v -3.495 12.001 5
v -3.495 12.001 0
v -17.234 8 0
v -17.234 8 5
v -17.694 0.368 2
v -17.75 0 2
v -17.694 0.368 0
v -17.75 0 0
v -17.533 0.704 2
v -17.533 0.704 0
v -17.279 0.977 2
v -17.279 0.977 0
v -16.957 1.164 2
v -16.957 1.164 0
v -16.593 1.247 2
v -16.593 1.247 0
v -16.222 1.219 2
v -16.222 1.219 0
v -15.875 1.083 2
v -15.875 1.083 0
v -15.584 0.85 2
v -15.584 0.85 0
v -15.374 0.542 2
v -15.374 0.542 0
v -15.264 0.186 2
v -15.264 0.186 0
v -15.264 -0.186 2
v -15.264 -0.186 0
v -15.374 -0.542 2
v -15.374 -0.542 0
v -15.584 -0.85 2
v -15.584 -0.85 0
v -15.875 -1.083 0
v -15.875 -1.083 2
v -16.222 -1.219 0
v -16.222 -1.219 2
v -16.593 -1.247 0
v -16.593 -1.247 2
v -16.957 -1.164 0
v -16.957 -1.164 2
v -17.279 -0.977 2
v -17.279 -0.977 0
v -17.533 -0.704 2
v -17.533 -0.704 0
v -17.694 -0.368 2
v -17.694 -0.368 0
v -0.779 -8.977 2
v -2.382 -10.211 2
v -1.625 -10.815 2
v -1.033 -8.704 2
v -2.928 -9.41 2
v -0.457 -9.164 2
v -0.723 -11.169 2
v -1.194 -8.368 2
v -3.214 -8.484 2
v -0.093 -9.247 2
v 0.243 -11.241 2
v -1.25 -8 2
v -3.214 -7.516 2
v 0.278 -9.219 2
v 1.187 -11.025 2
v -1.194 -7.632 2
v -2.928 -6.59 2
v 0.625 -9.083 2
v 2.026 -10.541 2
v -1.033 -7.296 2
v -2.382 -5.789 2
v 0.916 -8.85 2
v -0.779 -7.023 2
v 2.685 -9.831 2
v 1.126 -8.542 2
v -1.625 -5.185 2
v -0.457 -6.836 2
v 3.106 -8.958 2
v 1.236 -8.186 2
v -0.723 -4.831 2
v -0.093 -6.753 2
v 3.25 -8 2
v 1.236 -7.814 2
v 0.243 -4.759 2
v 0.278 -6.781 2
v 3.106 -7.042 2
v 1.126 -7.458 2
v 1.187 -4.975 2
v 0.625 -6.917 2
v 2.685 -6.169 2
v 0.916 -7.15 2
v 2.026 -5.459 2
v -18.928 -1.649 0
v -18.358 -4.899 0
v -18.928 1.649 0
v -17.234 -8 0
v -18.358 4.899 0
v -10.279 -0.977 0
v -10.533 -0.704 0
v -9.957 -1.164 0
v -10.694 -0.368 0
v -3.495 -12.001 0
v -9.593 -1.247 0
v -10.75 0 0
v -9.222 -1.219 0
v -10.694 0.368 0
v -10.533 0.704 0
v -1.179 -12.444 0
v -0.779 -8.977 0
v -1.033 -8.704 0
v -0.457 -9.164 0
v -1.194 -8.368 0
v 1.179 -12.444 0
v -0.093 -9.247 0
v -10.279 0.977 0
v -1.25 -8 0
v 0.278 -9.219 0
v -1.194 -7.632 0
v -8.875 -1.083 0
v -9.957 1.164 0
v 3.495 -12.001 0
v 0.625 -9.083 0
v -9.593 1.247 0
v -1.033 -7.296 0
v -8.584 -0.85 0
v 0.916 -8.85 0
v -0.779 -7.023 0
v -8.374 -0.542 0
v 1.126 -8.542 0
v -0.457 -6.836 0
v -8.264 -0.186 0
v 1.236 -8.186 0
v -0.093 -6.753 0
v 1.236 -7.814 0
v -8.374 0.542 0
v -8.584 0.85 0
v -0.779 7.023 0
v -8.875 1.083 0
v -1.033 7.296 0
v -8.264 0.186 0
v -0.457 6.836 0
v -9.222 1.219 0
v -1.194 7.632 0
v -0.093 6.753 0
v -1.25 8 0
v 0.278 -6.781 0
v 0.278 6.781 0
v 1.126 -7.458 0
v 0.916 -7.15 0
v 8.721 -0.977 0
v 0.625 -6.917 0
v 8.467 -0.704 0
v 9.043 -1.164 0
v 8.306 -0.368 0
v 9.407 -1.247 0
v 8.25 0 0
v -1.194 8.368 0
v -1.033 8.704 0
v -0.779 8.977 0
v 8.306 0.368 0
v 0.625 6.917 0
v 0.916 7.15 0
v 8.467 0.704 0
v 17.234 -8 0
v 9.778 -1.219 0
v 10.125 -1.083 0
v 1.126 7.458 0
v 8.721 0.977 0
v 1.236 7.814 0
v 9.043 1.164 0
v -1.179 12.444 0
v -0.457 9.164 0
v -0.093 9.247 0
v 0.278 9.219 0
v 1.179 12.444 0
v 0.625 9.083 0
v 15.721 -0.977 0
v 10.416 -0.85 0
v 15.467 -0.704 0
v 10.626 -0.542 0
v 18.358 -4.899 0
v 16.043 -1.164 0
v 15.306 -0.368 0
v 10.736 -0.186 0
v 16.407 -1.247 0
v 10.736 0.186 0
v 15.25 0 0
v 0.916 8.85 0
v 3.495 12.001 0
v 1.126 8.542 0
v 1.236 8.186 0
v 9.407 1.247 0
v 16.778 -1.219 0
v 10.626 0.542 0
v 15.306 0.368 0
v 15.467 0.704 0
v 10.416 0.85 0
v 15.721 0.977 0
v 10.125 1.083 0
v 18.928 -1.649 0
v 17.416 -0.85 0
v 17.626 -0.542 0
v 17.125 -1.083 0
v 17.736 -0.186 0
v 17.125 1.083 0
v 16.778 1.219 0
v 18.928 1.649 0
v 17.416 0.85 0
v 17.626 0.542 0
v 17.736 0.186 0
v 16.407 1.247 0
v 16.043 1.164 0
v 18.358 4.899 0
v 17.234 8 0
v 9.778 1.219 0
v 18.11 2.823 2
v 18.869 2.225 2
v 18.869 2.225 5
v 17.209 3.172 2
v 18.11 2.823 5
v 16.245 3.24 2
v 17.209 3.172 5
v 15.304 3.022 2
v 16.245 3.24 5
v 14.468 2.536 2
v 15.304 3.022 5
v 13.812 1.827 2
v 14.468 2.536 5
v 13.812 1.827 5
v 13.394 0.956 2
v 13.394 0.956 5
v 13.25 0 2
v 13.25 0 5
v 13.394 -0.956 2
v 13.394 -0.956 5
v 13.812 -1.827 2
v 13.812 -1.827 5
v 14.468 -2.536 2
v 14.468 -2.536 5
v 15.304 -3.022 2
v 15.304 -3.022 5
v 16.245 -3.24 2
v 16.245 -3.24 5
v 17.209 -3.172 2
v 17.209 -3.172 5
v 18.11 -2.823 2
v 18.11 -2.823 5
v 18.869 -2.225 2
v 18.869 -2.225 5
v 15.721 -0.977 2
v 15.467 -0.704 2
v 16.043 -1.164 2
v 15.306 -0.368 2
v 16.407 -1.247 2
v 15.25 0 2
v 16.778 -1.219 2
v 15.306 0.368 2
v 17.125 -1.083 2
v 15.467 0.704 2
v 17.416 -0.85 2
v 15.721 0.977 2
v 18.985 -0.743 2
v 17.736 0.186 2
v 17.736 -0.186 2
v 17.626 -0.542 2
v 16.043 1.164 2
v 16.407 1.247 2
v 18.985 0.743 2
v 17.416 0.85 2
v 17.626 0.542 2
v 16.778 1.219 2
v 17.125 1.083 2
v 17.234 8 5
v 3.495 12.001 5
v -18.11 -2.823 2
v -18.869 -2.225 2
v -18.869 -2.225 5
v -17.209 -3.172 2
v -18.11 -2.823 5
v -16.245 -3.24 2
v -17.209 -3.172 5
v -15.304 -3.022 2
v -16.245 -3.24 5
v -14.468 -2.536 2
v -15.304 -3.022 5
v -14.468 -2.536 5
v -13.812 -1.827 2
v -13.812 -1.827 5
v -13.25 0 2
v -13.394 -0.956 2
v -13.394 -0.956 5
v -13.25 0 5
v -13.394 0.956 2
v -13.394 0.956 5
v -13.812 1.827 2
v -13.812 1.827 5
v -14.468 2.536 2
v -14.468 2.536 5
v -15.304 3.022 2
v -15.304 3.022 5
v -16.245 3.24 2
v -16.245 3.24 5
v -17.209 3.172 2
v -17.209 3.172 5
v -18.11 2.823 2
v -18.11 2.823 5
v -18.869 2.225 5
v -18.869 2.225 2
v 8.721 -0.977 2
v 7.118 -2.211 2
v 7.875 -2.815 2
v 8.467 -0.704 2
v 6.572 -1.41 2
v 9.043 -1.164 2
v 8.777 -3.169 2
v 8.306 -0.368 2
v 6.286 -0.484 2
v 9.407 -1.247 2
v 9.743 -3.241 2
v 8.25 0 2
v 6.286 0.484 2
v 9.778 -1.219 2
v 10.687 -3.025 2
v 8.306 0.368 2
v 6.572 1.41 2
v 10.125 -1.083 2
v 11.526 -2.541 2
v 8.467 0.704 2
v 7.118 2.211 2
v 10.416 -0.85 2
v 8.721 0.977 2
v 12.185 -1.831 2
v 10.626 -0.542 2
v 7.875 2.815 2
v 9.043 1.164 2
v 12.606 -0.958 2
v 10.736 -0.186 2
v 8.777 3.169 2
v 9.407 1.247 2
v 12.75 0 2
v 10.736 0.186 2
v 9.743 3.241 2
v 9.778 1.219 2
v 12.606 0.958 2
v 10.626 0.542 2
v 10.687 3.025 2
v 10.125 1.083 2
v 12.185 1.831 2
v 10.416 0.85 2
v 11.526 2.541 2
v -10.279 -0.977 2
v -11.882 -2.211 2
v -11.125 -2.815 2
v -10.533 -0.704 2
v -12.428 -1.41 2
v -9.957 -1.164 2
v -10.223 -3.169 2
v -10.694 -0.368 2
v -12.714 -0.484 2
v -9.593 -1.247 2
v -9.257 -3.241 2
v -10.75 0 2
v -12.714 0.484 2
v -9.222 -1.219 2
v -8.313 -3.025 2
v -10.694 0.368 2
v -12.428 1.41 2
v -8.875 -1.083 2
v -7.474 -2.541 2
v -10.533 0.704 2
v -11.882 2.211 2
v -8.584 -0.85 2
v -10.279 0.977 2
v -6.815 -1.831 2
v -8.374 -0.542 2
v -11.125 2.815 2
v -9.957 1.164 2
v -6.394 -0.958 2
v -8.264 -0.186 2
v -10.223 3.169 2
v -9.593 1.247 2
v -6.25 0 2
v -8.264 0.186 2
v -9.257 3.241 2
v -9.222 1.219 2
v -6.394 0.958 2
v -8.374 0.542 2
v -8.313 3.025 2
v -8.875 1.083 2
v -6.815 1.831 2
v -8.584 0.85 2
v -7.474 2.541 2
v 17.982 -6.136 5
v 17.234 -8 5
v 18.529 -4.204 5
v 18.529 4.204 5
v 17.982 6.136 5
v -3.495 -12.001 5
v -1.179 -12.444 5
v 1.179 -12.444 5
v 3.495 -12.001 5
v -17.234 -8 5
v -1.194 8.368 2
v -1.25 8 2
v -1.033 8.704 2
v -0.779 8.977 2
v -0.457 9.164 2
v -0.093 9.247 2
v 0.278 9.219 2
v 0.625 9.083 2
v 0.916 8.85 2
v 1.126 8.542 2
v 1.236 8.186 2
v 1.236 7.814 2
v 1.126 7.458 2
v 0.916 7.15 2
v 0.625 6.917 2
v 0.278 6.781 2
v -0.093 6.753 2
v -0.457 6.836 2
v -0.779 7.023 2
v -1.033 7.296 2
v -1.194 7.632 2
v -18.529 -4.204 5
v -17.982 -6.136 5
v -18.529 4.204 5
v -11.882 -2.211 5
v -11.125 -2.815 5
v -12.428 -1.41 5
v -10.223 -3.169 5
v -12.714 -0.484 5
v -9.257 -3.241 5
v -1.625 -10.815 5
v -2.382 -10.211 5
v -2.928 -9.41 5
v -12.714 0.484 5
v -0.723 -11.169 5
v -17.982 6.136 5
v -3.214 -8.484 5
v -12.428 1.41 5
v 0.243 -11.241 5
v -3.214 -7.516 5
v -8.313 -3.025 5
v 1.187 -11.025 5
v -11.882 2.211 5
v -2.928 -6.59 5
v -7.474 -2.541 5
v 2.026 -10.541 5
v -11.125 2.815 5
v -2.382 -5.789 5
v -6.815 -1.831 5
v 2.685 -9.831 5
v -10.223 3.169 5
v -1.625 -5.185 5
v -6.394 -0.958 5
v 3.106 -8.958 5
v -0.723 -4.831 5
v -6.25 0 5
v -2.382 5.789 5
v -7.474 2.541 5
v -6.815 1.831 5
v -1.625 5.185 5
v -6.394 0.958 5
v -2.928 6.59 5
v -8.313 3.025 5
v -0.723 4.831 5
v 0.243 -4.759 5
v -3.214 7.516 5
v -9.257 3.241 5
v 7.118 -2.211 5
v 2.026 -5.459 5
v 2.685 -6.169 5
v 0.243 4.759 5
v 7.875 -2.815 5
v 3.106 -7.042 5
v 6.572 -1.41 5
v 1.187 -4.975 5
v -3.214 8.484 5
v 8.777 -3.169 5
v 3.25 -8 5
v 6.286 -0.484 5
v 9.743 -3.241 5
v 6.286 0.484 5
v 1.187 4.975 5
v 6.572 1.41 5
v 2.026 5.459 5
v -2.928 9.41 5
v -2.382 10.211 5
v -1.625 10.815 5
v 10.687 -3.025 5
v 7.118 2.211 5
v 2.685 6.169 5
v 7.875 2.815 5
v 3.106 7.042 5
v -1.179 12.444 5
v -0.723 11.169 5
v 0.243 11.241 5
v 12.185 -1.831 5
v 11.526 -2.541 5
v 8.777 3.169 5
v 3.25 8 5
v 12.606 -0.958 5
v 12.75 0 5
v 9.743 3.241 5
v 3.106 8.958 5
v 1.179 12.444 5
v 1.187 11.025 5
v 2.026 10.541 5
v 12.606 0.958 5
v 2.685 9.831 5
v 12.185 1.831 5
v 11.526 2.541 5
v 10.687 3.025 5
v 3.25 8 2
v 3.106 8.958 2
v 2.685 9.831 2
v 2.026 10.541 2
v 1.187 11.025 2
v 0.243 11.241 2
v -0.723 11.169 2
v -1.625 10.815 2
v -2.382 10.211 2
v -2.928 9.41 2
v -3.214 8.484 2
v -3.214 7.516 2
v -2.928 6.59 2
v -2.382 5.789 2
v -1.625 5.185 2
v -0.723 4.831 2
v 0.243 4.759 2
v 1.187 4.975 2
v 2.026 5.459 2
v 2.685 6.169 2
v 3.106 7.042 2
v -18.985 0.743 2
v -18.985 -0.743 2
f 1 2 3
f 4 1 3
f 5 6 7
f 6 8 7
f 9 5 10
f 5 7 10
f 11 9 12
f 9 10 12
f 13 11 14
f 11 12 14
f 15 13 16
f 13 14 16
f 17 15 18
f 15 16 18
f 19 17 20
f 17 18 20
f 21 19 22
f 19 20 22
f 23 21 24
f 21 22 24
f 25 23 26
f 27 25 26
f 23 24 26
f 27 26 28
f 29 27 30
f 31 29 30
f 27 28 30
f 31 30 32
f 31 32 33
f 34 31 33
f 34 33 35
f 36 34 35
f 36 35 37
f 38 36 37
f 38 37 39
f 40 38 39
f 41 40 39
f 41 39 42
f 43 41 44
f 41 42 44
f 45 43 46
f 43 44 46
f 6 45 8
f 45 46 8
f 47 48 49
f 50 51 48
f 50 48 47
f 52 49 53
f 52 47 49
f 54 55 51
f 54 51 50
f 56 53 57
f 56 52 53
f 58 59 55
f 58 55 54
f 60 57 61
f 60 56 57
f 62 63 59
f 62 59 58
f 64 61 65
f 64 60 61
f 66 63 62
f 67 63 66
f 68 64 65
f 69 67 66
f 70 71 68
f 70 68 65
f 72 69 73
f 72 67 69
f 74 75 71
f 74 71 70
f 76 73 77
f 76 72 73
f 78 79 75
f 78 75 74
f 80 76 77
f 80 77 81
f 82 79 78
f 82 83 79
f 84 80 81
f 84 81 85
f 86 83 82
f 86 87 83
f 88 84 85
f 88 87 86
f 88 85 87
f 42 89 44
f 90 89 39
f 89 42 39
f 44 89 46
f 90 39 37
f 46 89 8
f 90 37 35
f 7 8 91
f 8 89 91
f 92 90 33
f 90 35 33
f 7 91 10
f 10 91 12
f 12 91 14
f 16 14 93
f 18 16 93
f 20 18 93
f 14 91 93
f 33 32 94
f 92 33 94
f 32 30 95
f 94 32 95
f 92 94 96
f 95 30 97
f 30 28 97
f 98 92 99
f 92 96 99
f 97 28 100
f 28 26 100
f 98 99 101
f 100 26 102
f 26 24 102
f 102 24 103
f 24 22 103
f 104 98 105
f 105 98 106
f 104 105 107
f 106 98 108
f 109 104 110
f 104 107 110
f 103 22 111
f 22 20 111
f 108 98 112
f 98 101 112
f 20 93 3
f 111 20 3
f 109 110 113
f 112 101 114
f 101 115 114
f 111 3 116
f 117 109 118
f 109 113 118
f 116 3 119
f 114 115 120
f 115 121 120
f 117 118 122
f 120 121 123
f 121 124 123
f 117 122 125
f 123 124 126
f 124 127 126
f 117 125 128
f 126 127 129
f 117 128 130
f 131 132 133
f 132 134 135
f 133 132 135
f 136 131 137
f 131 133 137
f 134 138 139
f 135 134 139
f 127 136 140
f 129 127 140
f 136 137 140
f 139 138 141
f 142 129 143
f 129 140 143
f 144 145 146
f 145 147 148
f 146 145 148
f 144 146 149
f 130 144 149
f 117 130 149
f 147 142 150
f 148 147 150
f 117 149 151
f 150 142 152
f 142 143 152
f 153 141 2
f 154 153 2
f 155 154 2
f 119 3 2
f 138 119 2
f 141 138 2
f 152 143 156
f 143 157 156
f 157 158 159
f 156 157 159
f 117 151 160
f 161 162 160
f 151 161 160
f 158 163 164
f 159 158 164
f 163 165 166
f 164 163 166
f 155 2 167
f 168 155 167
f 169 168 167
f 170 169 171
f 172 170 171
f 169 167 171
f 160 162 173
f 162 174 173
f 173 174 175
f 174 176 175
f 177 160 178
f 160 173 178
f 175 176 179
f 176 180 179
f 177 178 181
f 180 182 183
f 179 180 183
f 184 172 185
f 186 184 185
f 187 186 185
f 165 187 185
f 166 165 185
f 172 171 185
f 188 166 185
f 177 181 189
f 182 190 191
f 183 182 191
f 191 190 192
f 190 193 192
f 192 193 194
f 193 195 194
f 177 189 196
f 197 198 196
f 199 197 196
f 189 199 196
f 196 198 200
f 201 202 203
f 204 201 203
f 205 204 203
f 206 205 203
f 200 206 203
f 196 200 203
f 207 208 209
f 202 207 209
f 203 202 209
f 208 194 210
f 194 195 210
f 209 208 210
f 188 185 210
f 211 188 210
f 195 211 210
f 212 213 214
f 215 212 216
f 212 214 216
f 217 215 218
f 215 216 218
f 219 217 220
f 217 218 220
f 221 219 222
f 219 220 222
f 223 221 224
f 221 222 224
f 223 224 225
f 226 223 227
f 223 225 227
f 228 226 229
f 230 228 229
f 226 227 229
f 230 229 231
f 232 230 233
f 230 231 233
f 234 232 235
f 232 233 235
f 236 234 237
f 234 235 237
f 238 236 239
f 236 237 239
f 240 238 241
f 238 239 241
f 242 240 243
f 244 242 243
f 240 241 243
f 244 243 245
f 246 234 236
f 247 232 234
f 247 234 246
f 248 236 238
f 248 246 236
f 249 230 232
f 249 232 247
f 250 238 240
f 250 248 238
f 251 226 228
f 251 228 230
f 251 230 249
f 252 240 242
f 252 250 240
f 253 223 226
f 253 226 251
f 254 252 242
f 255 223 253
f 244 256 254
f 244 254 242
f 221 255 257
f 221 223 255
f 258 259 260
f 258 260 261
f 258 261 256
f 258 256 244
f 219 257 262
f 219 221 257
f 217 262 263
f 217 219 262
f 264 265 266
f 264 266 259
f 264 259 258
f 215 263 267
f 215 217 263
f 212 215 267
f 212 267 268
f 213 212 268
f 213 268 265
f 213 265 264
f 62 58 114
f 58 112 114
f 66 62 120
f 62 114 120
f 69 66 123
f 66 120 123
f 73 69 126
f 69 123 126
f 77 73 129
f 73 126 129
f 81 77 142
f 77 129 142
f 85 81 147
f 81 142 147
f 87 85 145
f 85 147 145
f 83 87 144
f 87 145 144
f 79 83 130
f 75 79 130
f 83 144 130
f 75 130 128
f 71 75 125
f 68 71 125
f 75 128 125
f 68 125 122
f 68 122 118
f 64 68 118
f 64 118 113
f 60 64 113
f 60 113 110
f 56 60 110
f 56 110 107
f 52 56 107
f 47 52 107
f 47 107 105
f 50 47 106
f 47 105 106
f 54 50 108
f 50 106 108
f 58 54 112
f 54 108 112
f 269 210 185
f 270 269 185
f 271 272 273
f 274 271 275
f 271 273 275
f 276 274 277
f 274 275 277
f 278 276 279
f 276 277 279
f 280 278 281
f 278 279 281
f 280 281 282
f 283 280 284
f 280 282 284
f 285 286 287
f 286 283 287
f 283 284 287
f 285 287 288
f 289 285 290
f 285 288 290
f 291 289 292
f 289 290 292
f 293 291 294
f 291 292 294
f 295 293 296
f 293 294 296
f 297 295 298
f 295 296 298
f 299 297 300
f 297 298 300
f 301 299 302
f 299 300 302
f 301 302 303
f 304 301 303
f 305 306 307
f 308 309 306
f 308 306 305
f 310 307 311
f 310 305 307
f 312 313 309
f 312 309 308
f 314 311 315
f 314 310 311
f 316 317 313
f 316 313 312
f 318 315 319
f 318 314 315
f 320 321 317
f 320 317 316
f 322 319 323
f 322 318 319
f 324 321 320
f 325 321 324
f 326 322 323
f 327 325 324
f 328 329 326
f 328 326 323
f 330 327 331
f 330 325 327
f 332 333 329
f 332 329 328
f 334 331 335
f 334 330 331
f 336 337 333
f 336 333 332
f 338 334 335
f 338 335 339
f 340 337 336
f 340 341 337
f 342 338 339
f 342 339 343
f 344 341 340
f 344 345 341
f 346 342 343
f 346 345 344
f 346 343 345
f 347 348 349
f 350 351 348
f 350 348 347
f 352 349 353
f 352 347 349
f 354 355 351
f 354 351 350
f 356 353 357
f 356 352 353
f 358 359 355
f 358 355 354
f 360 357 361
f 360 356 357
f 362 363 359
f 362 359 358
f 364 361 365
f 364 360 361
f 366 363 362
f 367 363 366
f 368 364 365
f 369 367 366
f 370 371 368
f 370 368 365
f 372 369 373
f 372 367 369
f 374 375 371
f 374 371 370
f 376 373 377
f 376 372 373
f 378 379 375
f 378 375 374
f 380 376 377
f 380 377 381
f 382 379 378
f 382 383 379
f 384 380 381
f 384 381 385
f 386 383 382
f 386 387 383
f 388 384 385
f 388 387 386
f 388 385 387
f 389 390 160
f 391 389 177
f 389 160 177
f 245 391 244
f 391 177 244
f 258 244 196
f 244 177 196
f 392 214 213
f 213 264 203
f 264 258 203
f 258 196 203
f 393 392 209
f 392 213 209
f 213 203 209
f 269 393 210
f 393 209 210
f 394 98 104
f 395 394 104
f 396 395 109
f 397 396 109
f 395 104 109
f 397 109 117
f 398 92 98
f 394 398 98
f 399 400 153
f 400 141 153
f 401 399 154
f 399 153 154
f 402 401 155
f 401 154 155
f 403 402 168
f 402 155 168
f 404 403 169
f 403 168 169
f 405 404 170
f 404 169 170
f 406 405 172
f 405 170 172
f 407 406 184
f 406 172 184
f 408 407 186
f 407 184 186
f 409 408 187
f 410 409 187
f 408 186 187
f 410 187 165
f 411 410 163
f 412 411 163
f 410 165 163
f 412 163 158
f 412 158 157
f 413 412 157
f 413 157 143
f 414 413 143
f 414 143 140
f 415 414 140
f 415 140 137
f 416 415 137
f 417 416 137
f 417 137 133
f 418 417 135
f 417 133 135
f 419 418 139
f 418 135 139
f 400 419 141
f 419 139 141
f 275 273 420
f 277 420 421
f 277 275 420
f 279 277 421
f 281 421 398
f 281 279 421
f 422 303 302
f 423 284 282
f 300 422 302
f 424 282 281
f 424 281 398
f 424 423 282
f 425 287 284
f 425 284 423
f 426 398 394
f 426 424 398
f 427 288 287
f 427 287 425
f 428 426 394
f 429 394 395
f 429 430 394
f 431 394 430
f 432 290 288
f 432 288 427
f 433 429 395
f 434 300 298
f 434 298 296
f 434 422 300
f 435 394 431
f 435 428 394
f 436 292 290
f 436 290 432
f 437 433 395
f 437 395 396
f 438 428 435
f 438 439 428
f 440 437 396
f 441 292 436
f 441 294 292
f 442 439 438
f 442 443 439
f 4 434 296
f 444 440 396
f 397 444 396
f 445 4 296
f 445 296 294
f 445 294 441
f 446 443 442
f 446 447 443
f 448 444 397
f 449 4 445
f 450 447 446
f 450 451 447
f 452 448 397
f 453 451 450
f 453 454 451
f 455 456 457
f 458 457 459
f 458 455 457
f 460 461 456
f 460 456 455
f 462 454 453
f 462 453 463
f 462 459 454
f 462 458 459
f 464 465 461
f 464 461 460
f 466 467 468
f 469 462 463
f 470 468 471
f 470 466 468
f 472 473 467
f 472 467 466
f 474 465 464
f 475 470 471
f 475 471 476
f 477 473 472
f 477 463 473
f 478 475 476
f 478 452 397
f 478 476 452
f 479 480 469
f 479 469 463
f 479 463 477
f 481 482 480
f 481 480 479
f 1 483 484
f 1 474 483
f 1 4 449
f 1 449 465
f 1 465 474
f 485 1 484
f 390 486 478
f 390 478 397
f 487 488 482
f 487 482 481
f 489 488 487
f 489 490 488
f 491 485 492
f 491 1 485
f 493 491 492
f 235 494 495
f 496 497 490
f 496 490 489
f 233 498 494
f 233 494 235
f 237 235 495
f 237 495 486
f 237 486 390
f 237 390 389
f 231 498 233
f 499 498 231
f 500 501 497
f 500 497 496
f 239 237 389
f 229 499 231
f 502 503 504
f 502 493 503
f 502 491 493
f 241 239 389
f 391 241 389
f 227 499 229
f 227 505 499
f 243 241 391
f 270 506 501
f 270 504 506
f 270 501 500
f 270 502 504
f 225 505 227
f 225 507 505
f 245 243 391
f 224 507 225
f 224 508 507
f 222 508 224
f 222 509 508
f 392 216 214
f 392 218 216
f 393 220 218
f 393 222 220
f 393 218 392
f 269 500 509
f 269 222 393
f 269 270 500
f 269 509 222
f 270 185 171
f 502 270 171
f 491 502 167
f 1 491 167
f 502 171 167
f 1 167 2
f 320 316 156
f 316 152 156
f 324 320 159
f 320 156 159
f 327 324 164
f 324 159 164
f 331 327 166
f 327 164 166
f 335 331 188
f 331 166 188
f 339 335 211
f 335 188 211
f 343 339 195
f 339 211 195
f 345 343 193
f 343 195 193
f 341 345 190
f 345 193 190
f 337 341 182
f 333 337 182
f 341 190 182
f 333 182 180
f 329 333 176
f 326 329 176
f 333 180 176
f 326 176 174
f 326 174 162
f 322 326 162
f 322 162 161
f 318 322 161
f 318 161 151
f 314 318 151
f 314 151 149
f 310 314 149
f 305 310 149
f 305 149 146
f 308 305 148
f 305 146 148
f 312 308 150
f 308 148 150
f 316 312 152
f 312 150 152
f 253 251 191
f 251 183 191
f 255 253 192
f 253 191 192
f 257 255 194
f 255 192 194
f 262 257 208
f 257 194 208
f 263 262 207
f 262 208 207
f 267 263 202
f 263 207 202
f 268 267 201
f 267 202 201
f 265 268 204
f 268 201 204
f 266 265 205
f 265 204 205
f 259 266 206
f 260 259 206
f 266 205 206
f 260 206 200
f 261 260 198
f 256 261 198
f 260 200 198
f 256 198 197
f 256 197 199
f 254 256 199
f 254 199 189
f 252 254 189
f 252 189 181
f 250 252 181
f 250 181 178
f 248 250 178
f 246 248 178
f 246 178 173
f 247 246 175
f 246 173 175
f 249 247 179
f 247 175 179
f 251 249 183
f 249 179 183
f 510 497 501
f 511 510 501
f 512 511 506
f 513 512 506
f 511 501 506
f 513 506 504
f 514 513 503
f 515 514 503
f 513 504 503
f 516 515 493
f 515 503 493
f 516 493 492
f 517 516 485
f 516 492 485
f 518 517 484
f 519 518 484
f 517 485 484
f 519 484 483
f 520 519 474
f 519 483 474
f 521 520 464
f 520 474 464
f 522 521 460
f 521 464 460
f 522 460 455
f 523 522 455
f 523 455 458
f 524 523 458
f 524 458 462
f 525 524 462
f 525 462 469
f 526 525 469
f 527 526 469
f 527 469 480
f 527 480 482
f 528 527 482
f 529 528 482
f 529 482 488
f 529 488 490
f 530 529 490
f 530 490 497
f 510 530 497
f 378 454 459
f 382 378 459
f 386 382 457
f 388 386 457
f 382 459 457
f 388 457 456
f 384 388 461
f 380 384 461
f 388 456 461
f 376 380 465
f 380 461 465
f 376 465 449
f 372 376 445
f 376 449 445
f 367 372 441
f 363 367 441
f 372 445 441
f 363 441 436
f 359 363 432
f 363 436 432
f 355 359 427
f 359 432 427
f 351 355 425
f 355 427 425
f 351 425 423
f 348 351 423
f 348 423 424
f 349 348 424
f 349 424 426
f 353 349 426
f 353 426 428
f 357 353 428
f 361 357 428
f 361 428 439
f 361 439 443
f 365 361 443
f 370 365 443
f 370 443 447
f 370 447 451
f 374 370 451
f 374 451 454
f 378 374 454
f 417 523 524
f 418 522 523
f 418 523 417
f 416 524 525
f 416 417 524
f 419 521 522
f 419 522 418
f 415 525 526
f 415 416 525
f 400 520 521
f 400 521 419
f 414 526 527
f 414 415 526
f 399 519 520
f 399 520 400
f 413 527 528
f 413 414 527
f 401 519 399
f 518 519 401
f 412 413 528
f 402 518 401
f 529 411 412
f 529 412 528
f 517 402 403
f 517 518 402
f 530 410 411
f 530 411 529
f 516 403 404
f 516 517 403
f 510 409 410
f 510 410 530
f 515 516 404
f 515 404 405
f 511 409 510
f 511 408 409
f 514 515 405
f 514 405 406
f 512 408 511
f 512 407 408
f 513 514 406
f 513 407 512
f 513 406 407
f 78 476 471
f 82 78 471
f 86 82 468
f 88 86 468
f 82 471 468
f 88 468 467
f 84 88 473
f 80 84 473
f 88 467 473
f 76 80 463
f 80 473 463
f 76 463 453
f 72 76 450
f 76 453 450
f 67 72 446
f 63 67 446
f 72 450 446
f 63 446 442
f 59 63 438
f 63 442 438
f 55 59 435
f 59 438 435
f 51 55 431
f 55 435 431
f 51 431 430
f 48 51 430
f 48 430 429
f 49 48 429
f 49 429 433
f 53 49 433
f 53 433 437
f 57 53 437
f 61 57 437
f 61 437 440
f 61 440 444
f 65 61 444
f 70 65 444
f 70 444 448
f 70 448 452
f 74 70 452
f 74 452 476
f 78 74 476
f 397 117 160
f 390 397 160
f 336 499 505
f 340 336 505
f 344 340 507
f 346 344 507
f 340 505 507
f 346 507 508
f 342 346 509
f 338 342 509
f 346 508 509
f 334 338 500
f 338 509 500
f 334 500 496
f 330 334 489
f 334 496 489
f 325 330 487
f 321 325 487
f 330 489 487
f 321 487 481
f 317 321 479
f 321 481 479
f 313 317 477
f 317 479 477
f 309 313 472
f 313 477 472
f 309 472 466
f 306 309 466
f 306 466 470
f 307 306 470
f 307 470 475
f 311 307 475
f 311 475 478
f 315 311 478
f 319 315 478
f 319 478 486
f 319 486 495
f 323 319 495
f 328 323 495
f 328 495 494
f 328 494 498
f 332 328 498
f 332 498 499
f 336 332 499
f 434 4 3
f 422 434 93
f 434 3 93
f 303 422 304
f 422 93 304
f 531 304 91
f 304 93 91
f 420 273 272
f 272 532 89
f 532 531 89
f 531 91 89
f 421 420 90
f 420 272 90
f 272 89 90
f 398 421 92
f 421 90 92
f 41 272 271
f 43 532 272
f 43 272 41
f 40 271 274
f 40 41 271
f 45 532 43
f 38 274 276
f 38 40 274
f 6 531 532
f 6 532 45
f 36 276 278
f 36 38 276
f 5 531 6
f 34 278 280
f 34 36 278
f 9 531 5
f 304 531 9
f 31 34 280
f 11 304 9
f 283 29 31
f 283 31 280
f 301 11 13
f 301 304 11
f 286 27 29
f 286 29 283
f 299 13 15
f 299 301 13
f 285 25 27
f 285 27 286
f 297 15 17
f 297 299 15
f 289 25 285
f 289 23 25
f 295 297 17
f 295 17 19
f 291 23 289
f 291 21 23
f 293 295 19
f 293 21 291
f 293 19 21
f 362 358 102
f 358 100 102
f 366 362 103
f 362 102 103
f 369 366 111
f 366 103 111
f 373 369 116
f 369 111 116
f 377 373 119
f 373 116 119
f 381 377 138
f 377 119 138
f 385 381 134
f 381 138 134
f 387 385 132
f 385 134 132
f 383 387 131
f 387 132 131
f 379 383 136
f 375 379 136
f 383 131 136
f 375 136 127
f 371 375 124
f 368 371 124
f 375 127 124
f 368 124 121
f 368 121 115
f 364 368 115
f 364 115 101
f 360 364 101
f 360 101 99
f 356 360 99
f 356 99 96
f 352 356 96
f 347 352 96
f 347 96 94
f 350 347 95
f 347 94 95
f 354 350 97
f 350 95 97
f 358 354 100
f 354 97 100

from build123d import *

# Parameters (mm, degrees)
F1_DEPTH       = 5
F3_D           = 2.5
F3_CBORE_D     = 6.5
F3_CBORE_DEPTH = 3


with BuildPart() as f1:
    # F0 (on Top) → F1 (new body)
    with BuildSketch(Plane.XY):
        with BuildLine():
            Line((-3.4954430428, 12.0013281738), (-17.2336879396, 8))
            ThreePointArc((-17.2336879396, 8), (-19, 0), (-17.2336879396, -8))
            Line((-17.2336879396, -8), (-3.4954430428, -12.0013281738))
            ThreePointArc((-3.4954430428, -12.0013281738), (0, -12.5), (3.4954430428, -12.0013281738))
            Line((3.4954430428, -12.0013281738), (17.2336879396, -8))
            ThreePointArc((17.2336879396, -8), (19, 0), (17.2336879396, 8))
            Line((17.2336879396, 8), (3.4954430428, 12.0013281738))
            ThreePointArc((3.4954430428, 12.0013281738), (0, 12.5), (-3.4954430428, 12.0013281738))
        make_face()
    extrude(amount=F1_DEPTH)

    # F3 (through all)
    with Locations(Plane.XY.offset(5)):
        with Locations((-9.5, 0), (0, 8), (9.5, 0), (0, -8), (-16.5, 0), (16.5, 0)):
            CounterBoreHole(F3_D / 2, F3_CBORE_D / 2, F3_CBORE_DEPTH)


solid = f1.part
